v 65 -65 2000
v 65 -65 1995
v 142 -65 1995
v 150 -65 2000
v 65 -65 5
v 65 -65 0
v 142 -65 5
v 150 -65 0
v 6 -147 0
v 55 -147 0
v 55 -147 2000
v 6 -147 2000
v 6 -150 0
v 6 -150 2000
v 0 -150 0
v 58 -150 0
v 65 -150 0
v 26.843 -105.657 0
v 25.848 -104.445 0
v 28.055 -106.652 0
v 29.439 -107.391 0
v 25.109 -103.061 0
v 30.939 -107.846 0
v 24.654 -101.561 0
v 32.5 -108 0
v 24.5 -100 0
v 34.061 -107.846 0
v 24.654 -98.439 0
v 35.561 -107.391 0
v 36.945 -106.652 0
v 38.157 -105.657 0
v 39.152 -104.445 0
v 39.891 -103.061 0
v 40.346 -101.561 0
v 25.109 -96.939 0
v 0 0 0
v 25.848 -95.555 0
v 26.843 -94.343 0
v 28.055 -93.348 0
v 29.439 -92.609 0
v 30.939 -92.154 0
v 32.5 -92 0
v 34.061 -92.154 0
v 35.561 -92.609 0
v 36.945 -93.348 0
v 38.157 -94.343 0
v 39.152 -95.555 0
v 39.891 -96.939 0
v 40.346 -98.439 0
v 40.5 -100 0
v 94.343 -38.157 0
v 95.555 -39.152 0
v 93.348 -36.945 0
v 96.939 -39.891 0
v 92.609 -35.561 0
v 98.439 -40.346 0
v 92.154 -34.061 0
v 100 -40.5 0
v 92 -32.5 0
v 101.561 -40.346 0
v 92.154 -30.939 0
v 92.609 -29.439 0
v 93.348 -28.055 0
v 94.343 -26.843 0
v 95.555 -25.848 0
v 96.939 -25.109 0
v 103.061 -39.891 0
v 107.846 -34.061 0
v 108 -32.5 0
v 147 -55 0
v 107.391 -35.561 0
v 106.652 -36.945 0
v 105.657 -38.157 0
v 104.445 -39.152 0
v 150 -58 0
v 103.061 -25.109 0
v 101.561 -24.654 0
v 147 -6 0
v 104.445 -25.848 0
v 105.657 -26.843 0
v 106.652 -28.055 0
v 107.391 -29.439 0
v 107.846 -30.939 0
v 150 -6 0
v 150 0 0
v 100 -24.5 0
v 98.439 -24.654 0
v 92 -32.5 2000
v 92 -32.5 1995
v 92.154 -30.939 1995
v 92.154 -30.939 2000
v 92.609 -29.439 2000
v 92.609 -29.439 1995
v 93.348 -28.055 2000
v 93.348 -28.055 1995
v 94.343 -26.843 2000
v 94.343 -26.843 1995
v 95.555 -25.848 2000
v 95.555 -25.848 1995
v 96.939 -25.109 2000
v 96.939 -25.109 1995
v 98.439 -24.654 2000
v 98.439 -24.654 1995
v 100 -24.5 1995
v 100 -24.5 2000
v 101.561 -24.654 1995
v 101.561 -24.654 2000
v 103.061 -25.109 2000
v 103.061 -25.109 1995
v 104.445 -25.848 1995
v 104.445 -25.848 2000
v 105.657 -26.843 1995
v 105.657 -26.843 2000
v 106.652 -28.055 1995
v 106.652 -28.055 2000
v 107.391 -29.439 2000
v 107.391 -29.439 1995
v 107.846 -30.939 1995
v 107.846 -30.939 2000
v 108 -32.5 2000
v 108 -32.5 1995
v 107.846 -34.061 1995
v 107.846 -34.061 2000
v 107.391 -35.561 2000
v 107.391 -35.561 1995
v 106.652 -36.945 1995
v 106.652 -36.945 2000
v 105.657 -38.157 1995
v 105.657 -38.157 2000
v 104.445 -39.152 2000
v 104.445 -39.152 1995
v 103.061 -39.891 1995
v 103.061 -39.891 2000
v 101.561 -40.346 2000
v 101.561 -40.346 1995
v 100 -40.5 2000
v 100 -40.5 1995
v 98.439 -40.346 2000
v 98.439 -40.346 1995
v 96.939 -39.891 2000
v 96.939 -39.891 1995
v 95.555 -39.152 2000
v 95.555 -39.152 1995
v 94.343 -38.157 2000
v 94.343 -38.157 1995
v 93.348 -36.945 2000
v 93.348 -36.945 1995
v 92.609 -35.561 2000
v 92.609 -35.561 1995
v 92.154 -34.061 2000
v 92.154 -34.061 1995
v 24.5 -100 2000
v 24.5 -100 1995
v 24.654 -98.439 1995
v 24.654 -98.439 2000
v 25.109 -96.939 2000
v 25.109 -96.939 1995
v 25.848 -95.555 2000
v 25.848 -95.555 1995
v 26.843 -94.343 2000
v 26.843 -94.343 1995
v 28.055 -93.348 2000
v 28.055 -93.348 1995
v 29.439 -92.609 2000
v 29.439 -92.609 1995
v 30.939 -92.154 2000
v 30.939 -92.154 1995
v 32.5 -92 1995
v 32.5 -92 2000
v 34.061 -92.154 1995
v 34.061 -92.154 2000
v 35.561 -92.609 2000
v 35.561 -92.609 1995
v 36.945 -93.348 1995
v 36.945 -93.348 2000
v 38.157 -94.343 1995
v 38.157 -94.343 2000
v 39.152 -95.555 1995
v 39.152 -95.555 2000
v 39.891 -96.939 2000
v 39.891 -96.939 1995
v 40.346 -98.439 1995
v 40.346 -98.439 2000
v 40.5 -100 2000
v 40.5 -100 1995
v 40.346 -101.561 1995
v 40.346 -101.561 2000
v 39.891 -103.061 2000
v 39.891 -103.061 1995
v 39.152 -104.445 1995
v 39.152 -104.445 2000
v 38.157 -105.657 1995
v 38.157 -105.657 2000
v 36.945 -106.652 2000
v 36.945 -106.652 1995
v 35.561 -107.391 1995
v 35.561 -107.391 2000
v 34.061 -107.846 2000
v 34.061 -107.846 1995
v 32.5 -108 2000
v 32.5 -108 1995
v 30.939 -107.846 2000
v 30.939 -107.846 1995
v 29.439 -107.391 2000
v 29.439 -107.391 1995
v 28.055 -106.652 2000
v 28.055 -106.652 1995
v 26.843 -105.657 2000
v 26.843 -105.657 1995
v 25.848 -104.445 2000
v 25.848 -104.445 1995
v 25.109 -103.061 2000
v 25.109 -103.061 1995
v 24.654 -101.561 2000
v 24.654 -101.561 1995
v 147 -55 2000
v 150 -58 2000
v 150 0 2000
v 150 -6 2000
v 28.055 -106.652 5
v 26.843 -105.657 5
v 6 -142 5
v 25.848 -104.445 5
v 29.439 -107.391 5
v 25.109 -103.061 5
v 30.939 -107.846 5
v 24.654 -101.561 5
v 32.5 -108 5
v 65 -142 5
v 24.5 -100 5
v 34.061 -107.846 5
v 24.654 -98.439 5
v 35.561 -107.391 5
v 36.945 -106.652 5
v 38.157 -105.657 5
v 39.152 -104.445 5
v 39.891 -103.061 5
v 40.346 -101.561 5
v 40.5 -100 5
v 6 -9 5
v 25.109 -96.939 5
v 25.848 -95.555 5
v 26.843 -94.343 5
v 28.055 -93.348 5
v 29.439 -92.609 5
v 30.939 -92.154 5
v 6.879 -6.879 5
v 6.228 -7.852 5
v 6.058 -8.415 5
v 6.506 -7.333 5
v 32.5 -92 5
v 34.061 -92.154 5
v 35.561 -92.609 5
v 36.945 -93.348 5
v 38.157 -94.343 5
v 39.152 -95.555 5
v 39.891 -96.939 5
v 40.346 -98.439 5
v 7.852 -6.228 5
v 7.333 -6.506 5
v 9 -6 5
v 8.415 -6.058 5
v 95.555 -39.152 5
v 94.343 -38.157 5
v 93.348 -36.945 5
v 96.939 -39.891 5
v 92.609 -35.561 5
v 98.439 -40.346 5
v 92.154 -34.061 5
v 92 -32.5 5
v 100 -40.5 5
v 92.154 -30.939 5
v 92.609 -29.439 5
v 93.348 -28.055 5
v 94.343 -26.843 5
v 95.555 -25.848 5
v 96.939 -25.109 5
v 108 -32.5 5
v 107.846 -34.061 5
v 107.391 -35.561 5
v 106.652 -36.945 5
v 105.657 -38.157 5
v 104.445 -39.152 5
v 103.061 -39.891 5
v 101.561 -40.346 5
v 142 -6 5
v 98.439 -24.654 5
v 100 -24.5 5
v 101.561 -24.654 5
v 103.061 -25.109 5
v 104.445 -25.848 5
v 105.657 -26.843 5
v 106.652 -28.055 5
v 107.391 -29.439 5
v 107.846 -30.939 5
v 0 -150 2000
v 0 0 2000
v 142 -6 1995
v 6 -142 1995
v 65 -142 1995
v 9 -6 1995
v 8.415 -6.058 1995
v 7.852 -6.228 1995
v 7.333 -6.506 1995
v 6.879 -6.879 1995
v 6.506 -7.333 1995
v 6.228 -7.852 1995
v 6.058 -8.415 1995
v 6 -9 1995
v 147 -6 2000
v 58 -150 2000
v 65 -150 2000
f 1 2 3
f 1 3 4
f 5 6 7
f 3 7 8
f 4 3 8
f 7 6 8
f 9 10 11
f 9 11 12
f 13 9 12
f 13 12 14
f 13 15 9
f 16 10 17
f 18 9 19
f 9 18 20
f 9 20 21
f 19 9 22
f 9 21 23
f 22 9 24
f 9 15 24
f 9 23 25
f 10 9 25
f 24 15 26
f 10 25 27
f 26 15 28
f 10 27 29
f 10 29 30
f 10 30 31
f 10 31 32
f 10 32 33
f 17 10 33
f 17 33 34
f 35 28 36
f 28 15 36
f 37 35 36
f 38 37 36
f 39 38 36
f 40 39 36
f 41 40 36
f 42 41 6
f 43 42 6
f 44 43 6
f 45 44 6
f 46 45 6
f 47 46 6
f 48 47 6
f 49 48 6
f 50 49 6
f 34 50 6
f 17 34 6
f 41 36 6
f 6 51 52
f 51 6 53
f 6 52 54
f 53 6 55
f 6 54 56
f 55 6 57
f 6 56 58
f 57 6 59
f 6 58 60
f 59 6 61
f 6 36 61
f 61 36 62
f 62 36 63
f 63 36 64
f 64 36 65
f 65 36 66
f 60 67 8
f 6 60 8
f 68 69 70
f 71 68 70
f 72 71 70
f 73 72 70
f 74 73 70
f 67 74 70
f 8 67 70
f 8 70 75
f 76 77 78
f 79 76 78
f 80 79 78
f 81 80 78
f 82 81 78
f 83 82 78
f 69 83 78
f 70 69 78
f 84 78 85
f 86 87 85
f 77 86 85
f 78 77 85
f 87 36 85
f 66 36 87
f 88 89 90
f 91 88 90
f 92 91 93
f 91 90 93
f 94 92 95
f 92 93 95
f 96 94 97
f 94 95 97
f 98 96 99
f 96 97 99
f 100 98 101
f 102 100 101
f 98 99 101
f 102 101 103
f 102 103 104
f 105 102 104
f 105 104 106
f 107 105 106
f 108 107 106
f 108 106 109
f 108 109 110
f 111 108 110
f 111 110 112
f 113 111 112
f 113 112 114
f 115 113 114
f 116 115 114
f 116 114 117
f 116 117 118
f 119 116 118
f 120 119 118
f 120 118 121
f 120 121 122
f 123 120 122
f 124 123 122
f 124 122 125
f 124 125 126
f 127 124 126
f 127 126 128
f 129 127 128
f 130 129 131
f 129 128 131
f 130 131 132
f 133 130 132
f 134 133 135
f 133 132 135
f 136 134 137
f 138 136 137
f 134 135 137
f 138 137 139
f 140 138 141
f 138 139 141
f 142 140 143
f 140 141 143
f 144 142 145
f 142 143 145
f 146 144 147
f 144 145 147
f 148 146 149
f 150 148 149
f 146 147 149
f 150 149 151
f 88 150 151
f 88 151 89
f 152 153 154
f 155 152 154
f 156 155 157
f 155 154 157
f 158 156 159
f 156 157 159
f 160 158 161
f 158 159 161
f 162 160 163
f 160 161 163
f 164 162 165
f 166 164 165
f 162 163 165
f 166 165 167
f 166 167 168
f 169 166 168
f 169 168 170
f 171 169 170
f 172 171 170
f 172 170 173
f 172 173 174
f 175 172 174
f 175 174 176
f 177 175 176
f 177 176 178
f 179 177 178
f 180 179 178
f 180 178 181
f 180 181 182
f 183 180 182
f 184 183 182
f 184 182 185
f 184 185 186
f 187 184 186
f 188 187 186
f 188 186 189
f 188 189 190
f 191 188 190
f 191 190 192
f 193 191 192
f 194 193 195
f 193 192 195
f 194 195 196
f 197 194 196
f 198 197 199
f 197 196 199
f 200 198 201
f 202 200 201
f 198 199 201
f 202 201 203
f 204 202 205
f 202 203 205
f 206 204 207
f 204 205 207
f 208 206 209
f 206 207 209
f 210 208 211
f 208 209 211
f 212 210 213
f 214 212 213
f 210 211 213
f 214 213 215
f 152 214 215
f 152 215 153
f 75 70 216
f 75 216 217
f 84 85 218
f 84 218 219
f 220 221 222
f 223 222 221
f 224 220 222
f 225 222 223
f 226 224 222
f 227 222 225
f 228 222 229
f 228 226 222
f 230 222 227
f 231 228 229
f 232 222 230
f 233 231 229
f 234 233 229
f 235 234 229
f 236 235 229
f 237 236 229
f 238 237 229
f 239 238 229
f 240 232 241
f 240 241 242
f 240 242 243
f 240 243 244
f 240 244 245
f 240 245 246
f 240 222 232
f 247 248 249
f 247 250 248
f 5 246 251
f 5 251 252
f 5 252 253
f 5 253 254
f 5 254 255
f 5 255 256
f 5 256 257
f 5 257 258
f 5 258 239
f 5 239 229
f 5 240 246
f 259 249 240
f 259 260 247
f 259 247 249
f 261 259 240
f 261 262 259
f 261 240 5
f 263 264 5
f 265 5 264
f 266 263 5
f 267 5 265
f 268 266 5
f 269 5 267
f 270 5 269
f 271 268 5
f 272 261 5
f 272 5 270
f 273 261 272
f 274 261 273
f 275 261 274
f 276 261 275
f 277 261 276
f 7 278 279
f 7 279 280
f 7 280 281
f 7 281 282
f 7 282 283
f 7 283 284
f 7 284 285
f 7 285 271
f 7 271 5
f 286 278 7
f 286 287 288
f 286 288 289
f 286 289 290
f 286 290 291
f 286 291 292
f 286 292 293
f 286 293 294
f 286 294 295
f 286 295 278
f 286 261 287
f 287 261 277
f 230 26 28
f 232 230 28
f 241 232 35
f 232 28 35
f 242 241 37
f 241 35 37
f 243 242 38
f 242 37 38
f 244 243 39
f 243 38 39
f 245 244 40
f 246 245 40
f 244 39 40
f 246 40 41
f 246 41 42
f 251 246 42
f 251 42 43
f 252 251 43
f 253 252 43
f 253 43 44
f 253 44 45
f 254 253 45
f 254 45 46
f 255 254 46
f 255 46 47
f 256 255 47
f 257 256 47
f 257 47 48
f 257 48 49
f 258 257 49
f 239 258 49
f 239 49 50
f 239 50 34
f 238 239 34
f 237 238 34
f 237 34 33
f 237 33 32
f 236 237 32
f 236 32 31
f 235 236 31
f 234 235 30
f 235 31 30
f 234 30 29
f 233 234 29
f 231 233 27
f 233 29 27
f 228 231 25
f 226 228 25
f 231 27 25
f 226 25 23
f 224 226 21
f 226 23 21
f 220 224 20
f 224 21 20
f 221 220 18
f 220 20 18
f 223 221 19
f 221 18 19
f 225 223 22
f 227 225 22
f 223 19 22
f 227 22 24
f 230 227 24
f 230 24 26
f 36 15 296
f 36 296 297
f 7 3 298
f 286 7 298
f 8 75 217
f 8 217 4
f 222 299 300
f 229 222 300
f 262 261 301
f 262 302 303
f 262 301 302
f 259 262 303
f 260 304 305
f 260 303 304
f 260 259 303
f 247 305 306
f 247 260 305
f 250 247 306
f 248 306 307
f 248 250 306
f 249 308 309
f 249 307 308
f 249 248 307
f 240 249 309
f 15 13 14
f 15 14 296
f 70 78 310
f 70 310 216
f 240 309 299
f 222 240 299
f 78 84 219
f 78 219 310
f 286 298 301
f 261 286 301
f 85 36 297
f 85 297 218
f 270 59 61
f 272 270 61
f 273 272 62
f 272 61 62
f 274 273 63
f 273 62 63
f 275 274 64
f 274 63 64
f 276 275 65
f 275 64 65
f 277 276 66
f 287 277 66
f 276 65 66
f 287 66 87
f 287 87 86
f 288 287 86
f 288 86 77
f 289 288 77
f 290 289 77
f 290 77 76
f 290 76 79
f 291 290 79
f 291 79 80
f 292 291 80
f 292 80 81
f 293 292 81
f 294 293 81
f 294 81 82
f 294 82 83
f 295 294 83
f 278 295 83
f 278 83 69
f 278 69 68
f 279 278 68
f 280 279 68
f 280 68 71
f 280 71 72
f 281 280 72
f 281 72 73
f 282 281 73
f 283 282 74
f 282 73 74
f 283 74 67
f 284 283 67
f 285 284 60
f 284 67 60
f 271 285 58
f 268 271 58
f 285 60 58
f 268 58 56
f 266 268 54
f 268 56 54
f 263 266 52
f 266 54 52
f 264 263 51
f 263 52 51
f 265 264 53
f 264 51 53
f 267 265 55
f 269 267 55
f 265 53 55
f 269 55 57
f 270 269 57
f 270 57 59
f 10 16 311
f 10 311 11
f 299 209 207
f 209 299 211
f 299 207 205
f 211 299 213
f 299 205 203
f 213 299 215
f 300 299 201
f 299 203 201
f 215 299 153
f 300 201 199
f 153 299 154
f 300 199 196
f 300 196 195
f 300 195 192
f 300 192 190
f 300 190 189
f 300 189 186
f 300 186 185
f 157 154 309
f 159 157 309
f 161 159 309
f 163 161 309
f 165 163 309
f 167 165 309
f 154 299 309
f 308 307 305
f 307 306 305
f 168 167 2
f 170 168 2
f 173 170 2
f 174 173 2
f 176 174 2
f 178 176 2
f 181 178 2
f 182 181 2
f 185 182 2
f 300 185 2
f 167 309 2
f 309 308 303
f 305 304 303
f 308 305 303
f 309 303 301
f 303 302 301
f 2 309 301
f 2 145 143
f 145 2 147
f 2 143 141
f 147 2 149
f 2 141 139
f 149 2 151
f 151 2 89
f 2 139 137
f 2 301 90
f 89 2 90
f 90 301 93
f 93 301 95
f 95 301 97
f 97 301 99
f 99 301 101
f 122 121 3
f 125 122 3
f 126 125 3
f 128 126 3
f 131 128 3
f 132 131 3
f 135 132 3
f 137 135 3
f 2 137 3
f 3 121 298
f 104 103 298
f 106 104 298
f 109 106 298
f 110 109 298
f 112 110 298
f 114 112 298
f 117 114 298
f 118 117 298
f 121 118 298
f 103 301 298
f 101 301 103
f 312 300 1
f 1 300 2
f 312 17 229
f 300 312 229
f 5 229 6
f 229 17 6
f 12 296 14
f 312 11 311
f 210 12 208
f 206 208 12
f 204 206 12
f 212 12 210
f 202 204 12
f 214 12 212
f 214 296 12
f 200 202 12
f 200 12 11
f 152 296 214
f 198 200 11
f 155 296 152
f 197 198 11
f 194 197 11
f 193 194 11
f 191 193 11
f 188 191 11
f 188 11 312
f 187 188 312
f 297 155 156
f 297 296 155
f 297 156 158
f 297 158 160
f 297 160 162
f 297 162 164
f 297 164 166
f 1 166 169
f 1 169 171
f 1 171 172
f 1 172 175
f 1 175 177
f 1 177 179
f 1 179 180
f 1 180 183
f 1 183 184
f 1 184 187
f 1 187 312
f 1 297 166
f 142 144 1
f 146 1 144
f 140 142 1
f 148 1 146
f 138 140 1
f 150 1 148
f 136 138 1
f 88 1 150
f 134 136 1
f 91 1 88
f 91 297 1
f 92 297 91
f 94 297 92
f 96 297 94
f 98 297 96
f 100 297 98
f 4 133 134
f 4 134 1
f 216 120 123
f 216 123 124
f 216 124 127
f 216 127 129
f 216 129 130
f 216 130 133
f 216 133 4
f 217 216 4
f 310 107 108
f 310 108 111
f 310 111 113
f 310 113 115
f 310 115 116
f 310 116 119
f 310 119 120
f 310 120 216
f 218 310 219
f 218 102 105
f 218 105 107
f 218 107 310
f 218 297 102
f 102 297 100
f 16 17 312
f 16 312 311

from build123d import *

# Parameters (mm, degrees)
EXTRUDE_1_DEPTH         = 2000
EXTRUDE_2_DEPTH         = 5
HOLE_WIZARD_16_0_16_1_D = 16


with BuildPart() as part:
    # Model → 凸台-拉伸1 (new body)
    with BuildSketch(Plane.XY):
        with BuildLine():
            Line((55, -147), (6, -147))
            Line((6, -147), (6, -150))
            Line((6, -150), (0, -150))
            Line((0, -150), (0, 0))
            Line((0, 0), (150, 0))
            Line((150, 0), (150, -6))
            Line((150, -6), (147, -6))
            Line((147, -6), (147, -55))
            Line((147, -55), (150, -58))
            Line((150, -58), (150, -65))
            Line((150, -65), (142, -65))
            Line((142, -65), (142, -6))
            Line((142, -6), (9, -6))
            ThreePointArc((9, -6), (6.878679656, -6.878679656), (6, -9))
            Line((6, -9), (6, -142))
            Line((6, -142), (65, -142))
            Line((65, -142), (65, -150))
            Line((65, -150), (58, -150))
            Line((58, -150), (55, -147))
        make_face()
    extrude(amount=EXTRUDE_1_DEPTH)

    # 草图2 → 凸台-拉伸2 (add)
    with BuildSketch(Plane.XY.offset(2000)):
        Polygon((65, -142), (65, -65), (142, -65), (142, -6), (6, -6), (6, -142), align=None)
    extrude_2 = extrude(amount=-EXTRUDE_2_DEPTH)

    # 镜向1: 凸台-拉伸2 across plane
    add(extrude_2.mirror(Plane.XY.offset(1000)))

    # Ø16.0 (16) 直径孔1 (through all)
    with Locations(Plane.XY.offset(2000)):
        with Locations((100, -32.5), (32.5, -100)):
            Hole(HOLE_WIZARD_16_0_16_1_D / 2)


solid = part.part
